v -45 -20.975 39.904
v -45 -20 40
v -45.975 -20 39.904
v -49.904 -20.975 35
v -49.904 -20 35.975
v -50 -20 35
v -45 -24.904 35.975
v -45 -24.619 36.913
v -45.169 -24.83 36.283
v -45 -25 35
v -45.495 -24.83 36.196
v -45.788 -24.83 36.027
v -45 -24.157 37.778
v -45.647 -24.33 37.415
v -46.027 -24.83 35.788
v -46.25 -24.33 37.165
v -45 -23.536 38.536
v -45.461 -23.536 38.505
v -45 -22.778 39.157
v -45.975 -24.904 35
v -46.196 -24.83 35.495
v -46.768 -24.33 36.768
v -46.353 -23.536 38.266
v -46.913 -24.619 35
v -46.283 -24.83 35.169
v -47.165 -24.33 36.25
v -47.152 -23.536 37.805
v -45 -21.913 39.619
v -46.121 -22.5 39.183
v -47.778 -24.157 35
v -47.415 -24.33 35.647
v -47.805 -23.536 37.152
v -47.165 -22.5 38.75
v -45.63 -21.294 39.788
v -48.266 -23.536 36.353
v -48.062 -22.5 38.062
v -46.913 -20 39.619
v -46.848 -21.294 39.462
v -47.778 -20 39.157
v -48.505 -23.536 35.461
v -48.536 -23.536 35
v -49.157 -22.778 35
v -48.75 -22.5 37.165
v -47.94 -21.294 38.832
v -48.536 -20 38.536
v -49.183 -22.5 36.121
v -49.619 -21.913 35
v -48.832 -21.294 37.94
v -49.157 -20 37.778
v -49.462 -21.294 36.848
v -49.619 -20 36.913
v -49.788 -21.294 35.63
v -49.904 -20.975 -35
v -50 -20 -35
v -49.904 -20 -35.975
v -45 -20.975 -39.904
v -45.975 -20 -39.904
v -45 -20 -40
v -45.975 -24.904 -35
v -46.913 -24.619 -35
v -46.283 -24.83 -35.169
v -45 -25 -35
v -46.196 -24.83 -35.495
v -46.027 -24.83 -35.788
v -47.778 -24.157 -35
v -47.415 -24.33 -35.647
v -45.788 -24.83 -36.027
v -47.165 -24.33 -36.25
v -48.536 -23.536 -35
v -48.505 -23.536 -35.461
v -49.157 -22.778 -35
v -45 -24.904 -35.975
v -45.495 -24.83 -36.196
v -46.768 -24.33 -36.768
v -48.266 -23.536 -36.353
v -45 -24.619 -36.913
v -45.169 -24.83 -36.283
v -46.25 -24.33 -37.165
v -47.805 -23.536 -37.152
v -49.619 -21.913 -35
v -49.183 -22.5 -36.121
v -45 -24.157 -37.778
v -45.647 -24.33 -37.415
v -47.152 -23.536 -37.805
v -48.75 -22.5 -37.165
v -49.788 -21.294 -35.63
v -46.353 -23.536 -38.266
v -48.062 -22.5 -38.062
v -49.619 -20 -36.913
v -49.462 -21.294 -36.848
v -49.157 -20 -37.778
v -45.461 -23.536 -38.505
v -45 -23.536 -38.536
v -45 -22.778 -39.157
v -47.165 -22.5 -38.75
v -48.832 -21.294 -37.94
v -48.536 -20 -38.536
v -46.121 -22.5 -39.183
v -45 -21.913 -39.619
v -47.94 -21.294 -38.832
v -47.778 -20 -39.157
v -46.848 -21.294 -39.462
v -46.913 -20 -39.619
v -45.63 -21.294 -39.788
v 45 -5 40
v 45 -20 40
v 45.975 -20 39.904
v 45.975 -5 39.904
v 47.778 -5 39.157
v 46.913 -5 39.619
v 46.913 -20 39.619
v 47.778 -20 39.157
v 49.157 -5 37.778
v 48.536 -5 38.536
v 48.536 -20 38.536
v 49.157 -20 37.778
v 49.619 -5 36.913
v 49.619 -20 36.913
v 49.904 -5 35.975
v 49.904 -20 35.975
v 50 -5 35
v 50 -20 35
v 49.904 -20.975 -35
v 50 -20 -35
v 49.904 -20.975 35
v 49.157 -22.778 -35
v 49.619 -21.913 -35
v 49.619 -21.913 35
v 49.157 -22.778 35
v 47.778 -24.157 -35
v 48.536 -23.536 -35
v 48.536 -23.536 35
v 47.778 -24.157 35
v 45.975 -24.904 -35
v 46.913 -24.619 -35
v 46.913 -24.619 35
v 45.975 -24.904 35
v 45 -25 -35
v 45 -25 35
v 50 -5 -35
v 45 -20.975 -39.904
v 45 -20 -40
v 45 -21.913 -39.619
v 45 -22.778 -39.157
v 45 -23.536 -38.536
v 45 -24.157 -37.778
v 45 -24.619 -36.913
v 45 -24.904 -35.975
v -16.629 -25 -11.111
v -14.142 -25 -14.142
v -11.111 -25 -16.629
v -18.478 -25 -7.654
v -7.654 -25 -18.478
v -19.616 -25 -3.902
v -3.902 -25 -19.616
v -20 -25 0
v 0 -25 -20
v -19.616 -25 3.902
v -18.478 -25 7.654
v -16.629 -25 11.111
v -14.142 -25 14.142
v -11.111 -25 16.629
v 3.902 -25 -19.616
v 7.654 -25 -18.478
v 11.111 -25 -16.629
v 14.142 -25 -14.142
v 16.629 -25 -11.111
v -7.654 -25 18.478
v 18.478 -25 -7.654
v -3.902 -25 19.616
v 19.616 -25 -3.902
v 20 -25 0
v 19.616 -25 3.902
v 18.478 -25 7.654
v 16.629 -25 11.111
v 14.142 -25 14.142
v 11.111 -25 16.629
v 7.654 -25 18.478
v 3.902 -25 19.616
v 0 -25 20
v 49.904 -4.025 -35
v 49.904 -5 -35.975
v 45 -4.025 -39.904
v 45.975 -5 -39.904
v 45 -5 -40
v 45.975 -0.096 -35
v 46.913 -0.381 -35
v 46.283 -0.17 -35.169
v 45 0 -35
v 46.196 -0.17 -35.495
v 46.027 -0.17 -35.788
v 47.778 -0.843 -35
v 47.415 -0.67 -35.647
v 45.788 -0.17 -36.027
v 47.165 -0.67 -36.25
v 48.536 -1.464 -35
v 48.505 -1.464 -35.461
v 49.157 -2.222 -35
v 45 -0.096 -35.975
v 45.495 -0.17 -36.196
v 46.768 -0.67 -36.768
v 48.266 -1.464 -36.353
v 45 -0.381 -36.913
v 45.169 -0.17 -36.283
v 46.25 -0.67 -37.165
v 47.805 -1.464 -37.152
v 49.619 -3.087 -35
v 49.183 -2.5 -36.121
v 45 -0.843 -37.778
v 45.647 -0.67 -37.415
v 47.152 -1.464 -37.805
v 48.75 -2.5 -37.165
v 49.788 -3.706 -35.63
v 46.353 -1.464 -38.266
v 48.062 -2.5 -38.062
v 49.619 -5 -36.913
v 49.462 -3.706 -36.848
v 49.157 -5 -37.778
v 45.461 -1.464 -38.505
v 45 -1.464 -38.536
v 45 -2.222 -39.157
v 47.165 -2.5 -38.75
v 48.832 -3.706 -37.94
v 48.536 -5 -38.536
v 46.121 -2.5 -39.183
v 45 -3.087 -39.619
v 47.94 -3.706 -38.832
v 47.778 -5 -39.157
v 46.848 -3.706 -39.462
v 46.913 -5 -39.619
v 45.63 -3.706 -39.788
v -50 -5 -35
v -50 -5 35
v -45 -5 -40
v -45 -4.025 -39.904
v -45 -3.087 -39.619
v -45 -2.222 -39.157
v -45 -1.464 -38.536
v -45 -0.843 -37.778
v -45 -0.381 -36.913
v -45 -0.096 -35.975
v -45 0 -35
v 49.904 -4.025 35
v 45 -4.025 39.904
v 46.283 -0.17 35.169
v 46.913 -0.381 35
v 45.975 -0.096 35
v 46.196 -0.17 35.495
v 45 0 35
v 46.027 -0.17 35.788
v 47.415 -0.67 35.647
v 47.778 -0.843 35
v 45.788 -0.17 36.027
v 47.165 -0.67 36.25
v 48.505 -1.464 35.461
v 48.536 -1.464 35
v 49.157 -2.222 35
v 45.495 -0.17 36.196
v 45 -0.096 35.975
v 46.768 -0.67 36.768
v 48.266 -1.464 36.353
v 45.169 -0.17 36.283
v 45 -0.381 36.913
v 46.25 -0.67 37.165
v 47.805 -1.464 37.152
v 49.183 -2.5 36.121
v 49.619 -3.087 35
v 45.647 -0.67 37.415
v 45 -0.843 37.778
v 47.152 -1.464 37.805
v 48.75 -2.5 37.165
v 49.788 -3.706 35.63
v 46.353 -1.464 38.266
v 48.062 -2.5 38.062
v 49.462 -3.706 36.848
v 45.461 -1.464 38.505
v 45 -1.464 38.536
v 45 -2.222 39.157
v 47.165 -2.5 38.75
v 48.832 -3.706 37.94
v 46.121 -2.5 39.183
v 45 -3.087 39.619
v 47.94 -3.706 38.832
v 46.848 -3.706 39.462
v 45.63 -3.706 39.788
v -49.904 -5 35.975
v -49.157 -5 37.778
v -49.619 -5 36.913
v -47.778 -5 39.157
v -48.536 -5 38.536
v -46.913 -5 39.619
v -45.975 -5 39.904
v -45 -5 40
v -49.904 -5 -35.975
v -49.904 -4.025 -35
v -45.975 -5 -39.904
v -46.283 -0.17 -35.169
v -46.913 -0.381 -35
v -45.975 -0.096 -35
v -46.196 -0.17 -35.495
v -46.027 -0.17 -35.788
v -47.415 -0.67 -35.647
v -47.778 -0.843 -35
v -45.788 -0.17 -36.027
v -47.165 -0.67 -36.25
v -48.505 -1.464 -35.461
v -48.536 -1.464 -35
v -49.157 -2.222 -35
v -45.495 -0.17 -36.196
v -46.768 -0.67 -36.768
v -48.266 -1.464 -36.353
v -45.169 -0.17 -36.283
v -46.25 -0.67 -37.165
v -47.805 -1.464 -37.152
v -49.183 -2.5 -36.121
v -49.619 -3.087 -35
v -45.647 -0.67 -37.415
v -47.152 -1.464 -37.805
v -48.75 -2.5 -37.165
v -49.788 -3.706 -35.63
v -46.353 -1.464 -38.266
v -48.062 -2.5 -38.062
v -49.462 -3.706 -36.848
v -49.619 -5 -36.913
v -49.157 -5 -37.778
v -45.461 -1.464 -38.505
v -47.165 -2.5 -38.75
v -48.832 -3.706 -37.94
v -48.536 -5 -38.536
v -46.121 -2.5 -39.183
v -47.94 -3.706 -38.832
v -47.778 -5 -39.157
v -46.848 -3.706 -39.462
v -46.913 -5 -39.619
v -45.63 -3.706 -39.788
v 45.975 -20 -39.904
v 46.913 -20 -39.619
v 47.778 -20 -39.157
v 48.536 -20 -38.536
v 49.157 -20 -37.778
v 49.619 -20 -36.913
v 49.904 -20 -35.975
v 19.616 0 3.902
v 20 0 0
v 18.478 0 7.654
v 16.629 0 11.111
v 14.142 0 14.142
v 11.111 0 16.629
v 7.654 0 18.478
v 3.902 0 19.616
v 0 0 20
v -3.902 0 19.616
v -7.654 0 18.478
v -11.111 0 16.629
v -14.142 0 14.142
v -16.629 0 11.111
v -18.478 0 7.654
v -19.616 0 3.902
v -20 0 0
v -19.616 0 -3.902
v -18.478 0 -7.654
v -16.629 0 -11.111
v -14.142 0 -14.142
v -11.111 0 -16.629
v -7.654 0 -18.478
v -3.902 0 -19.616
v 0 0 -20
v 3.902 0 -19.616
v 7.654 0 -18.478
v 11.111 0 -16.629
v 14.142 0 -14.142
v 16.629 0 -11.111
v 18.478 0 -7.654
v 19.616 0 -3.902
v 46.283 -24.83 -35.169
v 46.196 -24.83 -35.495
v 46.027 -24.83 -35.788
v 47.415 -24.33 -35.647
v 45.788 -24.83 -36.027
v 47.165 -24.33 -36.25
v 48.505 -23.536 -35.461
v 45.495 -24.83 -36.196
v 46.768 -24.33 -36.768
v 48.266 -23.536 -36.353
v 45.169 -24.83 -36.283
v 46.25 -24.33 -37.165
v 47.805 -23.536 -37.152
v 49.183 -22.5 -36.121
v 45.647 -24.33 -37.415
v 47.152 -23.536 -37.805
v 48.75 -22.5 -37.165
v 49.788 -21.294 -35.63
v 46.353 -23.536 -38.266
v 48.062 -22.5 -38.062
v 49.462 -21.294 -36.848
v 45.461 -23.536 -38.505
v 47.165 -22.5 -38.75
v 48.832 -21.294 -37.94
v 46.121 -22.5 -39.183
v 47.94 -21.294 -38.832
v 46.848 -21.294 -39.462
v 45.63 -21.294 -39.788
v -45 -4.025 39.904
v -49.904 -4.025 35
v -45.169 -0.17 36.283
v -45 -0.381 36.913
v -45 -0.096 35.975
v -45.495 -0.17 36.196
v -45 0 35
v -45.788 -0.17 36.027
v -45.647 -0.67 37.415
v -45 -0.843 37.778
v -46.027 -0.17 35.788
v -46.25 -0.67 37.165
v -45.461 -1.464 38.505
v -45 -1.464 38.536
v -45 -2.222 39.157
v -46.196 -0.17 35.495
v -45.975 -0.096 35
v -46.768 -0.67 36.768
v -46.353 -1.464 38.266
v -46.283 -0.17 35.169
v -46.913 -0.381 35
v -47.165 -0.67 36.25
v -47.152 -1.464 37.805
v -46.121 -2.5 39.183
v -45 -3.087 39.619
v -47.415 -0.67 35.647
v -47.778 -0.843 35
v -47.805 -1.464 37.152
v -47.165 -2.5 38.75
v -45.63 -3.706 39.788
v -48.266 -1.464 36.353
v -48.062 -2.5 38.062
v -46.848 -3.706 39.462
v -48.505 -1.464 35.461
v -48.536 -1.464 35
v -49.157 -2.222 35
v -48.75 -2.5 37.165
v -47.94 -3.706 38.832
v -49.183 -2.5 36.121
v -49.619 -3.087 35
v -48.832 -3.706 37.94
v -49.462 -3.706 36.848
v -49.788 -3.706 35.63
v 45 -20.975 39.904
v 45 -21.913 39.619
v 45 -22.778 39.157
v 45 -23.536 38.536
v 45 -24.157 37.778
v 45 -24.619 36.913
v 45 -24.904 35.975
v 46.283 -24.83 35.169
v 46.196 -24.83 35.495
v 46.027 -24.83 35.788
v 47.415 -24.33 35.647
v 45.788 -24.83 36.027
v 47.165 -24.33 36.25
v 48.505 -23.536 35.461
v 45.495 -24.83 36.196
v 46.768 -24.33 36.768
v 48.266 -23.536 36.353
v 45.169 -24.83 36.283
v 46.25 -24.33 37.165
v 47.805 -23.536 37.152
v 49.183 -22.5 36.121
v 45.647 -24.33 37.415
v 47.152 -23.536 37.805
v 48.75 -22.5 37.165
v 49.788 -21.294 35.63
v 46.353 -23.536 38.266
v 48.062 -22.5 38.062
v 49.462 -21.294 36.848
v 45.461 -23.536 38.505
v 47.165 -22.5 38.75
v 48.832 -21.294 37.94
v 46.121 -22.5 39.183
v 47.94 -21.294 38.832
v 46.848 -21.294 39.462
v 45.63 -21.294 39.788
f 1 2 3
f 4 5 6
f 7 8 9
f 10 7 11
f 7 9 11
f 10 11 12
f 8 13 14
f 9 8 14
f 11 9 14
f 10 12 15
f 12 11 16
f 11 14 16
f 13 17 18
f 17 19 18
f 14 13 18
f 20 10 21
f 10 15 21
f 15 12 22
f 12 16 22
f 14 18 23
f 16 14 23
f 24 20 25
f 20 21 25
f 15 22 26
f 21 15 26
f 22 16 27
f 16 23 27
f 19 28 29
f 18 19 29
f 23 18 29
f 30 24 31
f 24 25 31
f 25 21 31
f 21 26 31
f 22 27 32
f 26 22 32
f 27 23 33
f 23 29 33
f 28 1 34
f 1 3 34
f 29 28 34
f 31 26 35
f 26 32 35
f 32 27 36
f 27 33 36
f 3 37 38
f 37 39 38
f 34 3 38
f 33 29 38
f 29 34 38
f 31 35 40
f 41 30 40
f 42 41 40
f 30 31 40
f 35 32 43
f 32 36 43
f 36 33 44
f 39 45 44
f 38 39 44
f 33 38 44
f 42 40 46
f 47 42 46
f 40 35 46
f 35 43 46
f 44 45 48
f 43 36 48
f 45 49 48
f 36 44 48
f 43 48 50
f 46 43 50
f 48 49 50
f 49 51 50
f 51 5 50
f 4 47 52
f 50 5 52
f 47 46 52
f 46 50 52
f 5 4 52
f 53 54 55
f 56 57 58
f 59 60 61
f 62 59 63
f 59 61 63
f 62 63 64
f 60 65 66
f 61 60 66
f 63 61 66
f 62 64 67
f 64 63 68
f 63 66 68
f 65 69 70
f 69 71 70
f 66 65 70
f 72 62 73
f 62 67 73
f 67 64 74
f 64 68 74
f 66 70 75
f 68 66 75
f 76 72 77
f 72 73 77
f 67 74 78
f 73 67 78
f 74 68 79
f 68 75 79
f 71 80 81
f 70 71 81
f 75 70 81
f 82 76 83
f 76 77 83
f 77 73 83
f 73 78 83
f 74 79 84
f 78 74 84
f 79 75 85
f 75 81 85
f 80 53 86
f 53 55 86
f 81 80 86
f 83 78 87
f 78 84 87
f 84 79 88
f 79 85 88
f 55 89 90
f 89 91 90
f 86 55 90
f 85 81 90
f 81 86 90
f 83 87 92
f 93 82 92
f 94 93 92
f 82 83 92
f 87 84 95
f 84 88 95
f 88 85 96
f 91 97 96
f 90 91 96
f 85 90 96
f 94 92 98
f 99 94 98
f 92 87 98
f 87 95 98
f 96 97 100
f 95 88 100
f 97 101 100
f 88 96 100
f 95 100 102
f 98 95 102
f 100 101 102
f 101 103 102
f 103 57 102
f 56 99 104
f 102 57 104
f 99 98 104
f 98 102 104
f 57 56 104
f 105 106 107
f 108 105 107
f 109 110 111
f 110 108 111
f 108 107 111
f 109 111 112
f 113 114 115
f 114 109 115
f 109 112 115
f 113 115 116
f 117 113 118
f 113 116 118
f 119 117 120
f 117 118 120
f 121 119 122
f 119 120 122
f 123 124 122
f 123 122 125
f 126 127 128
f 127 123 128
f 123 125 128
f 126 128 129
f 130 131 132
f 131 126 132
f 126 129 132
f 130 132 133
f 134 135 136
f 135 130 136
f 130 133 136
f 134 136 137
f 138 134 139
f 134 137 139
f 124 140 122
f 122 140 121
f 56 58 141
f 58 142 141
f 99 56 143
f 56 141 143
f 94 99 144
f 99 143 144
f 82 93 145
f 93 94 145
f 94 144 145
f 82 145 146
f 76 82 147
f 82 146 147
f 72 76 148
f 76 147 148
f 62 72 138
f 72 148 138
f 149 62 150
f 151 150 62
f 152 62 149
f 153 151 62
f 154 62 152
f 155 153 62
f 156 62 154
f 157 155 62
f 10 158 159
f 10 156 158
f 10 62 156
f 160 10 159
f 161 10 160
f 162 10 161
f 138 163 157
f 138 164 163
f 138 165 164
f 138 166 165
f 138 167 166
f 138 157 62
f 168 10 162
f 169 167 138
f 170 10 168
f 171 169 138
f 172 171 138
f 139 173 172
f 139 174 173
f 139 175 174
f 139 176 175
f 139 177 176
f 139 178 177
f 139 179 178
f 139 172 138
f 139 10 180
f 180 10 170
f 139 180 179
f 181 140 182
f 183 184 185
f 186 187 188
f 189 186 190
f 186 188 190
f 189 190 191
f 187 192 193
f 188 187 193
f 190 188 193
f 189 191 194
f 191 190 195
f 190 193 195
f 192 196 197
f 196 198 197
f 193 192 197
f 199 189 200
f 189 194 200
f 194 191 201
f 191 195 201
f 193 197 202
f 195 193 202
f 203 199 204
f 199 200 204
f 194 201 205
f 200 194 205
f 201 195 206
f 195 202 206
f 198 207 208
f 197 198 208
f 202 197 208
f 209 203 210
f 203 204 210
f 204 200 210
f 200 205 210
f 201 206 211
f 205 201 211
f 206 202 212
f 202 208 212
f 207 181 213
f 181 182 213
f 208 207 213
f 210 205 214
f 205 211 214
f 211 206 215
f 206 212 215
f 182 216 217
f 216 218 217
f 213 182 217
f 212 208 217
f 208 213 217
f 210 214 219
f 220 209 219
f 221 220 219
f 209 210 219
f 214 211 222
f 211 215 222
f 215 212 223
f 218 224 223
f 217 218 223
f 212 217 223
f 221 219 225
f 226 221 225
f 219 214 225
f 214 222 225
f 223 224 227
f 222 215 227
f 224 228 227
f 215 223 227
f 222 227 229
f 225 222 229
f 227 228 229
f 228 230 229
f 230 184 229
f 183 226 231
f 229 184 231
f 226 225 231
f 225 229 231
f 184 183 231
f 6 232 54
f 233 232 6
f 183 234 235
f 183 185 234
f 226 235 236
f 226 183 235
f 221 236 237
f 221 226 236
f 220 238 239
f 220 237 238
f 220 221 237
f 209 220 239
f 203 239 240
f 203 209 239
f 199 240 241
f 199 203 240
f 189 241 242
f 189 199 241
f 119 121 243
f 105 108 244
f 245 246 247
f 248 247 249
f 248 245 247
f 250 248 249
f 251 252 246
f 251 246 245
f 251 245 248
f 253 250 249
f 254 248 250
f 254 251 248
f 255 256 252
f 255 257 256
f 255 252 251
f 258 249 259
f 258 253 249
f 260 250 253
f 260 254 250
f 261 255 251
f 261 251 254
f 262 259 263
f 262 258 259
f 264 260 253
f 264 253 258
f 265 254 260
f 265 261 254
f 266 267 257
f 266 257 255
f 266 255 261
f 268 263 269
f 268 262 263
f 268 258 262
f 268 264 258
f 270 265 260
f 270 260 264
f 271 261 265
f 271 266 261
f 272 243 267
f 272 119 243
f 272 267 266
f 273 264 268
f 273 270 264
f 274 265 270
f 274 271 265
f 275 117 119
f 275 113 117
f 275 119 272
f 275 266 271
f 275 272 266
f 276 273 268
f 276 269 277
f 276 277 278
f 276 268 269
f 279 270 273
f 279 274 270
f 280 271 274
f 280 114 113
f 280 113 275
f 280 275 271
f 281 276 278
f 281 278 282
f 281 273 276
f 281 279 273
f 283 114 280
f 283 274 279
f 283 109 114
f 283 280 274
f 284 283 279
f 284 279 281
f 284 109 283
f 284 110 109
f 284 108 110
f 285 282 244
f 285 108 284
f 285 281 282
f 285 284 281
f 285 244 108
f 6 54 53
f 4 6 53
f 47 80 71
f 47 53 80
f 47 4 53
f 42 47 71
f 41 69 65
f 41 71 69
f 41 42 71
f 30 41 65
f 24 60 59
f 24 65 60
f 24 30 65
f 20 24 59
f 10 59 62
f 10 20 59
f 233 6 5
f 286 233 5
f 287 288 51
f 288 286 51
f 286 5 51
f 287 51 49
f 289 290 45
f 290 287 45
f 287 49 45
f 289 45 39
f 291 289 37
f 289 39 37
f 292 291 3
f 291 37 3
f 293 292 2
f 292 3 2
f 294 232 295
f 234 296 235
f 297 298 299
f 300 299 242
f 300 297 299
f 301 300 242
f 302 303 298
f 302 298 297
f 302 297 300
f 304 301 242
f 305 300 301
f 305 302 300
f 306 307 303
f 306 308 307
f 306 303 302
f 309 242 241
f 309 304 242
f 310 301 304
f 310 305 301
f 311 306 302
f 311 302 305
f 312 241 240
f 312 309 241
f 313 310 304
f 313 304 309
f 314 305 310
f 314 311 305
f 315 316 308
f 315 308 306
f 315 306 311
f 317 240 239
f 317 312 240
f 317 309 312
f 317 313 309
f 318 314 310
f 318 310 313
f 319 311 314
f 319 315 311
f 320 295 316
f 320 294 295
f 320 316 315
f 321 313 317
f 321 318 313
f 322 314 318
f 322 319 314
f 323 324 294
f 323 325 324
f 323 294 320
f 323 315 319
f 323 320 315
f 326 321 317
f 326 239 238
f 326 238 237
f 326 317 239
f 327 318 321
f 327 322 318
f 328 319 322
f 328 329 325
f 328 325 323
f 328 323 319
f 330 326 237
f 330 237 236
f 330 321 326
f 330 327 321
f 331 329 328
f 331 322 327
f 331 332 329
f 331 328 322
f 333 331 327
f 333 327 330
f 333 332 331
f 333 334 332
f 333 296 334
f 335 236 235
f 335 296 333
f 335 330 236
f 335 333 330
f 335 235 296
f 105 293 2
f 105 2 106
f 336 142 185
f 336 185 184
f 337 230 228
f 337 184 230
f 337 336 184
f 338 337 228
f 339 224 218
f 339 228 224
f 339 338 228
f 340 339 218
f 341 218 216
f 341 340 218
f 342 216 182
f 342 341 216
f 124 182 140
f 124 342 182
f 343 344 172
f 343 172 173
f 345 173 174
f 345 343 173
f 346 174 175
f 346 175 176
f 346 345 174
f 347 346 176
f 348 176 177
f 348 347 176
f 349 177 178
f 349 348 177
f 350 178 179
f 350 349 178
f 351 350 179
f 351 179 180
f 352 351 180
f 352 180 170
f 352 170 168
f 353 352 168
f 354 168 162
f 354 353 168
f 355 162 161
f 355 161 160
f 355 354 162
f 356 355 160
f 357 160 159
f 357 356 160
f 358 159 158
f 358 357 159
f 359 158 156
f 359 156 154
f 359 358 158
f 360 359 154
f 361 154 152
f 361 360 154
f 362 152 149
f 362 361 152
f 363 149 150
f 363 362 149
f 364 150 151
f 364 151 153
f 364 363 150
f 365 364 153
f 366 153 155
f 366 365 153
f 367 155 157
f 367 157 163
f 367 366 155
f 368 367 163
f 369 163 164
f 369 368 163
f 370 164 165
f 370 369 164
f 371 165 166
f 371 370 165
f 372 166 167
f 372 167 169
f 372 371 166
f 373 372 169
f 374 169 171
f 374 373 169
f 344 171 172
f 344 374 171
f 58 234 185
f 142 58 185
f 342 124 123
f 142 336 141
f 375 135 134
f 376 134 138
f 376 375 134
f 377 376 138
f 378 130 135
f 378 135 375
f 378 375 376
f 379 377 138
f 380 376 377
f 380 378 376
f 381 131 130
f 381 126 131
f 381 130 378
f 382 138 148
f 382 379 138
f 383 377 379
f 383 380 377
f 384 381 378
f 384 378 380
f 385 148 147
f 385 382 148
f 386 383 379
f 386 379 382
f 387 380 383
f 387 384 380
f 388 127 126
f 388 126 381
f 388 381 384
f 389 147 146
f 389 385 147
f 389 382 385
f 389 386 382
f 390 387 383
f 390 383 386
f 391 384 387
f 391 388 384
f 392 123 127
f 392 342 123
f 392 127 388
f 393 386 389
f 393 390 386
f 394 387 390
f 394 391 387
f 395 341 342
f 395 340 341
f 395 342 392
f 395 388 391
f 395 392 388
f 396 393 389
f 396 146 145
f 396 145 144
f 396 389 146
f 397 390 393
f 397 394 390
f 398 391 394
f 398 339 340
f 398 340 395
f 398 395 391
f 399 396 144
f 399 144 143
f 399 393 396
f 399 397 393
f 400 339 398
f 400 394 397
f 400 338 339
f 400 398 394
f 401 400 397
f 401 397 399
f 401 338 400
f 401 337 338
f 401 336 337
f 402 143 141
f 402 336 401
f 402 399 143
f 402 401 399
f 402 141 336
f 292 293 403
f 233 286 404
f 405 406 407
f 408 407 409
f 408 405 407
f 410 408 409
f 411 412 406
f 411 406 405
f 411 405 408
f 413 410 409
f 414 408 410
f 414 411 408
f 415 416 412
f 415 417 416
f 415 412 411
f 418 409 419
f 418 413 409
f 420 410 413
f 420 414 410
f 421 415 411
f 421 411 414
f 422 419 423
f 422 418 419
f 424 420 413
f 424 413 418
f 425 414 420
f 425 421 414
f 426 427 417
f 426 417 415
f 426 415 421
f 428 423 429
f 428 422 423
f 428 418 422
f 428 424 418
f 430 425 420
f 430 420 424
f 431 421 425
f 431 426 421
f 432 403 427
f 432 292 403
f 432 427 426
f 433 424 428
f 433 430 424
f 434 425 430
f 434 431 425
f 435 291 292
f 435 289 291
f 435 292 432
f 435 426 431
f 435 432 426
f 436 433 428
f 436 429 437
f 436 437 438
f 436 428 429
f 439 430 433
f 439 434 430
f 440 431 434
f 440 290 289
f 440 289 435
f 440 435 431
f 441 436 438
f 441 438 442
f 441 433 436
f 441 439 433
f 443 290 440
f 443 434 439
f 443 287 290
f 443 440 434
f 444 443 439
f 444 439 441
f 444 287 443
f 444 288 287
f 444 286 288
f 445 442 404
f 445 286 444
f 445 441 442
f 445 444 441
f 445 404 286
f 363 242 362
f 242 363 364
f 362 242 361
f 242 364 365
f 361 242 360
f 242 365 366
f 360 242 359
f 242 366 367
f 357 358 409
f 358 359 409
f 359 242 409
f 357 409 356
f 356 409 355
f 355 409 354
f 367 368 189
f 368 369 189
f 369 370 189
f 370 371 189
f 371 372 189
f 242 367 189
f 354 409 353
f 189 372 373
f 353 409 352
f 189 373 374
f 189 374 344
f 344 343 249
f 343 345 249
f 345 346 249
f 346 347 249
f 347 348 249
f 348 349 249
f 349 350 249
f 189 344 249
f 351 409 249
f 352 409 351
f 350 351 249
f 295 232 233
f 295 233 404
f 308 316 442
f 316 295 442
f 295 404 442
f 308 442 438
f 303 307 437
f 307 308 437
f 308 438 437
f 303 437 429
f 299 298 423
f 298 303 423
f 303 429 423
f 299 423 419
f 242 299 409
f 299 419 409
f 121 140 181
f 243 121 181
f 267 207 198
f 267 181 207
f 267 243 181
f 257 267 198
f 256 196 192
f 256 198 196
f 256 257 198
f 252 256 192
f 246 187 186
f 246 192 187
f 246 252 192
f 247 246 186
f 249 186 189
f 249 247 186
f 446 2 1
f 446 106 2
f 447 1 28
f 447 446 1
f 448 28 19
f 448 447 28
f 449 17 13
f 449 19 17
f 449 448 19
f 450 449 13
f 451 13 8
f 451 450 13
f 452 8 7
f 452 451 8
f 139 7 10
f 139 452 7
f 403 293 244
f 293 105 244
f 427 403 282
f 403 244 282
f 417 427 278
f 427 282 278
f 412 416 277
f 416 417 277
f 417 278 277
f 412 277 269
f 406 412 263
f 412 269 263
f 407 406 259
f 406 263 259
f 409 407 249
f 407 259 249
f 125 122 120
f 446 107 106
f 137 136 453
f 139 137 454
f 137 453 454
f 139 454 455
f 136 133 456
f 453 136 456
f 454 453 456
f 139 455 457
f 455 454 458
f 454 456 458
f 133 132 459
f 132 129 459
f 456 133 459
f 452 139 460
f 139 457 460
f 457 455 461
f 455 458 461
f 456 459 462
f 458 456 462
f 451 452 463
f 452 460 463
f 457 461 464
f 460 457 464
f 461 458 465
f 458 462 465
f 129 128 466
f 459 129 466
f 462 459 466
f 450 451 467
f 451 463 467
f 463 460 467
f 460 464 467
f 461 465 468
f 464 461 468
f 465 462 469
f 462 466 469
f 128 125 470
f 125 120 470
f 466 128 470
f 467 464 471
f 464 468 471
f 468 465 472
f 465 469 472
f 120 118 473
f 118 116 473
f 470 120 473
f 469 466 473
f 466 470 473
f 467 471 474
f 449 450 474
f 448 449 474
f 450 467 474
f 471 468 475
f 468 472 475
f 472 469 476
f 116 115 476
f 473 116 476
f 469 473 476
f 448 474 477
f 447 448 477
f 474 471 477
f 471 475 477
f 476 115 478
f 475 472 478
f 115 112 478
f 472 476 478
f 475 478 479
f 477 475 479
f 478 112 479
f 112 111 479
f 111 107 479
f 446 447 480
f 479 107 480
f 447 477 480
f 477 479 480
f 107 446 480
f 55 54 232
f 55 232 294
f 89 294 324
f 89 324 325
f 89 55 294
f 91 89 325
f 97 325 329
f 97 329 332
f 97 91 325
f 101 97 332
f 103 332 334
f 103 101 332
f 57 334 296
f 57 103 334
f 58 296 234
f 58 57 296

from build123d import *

# Parameters (mm, degrees)
F0_W     = 100
F0_H     = 80
F0_R     = 20
F1_DEPTH = 25
F2_R     = 5


with BuildPart() as f1:
    # F0 (on Front) → F1 (new body)
    with BuildSketch(Plane.XZ):
        Rectangle(F0_W, F0_H)
        Circle(F0_R, mode=Mode.SUBTRACT)
    extrude(amount=F1_DEPTH)

    # F2
    f2_edges = [f1.edges().sort_by_distance(p)[0] for p in [
        (50, -12.5, -40),
        (50, -12.5, 40),
        (50, 0, 0),
        (50, -25, 0),
        (-50, -12.5, 40),
        (0, 0, 40),
        (0, -25, 40),
        (-50, -12.5, -40),
        (-50, 0, 0),
        (-50, -25, 0),
        (0, 0, -40),
        (0, -25, -40),
    ]]
    fillet(f2_edges, radius=F2_R)


solid = f1.part
